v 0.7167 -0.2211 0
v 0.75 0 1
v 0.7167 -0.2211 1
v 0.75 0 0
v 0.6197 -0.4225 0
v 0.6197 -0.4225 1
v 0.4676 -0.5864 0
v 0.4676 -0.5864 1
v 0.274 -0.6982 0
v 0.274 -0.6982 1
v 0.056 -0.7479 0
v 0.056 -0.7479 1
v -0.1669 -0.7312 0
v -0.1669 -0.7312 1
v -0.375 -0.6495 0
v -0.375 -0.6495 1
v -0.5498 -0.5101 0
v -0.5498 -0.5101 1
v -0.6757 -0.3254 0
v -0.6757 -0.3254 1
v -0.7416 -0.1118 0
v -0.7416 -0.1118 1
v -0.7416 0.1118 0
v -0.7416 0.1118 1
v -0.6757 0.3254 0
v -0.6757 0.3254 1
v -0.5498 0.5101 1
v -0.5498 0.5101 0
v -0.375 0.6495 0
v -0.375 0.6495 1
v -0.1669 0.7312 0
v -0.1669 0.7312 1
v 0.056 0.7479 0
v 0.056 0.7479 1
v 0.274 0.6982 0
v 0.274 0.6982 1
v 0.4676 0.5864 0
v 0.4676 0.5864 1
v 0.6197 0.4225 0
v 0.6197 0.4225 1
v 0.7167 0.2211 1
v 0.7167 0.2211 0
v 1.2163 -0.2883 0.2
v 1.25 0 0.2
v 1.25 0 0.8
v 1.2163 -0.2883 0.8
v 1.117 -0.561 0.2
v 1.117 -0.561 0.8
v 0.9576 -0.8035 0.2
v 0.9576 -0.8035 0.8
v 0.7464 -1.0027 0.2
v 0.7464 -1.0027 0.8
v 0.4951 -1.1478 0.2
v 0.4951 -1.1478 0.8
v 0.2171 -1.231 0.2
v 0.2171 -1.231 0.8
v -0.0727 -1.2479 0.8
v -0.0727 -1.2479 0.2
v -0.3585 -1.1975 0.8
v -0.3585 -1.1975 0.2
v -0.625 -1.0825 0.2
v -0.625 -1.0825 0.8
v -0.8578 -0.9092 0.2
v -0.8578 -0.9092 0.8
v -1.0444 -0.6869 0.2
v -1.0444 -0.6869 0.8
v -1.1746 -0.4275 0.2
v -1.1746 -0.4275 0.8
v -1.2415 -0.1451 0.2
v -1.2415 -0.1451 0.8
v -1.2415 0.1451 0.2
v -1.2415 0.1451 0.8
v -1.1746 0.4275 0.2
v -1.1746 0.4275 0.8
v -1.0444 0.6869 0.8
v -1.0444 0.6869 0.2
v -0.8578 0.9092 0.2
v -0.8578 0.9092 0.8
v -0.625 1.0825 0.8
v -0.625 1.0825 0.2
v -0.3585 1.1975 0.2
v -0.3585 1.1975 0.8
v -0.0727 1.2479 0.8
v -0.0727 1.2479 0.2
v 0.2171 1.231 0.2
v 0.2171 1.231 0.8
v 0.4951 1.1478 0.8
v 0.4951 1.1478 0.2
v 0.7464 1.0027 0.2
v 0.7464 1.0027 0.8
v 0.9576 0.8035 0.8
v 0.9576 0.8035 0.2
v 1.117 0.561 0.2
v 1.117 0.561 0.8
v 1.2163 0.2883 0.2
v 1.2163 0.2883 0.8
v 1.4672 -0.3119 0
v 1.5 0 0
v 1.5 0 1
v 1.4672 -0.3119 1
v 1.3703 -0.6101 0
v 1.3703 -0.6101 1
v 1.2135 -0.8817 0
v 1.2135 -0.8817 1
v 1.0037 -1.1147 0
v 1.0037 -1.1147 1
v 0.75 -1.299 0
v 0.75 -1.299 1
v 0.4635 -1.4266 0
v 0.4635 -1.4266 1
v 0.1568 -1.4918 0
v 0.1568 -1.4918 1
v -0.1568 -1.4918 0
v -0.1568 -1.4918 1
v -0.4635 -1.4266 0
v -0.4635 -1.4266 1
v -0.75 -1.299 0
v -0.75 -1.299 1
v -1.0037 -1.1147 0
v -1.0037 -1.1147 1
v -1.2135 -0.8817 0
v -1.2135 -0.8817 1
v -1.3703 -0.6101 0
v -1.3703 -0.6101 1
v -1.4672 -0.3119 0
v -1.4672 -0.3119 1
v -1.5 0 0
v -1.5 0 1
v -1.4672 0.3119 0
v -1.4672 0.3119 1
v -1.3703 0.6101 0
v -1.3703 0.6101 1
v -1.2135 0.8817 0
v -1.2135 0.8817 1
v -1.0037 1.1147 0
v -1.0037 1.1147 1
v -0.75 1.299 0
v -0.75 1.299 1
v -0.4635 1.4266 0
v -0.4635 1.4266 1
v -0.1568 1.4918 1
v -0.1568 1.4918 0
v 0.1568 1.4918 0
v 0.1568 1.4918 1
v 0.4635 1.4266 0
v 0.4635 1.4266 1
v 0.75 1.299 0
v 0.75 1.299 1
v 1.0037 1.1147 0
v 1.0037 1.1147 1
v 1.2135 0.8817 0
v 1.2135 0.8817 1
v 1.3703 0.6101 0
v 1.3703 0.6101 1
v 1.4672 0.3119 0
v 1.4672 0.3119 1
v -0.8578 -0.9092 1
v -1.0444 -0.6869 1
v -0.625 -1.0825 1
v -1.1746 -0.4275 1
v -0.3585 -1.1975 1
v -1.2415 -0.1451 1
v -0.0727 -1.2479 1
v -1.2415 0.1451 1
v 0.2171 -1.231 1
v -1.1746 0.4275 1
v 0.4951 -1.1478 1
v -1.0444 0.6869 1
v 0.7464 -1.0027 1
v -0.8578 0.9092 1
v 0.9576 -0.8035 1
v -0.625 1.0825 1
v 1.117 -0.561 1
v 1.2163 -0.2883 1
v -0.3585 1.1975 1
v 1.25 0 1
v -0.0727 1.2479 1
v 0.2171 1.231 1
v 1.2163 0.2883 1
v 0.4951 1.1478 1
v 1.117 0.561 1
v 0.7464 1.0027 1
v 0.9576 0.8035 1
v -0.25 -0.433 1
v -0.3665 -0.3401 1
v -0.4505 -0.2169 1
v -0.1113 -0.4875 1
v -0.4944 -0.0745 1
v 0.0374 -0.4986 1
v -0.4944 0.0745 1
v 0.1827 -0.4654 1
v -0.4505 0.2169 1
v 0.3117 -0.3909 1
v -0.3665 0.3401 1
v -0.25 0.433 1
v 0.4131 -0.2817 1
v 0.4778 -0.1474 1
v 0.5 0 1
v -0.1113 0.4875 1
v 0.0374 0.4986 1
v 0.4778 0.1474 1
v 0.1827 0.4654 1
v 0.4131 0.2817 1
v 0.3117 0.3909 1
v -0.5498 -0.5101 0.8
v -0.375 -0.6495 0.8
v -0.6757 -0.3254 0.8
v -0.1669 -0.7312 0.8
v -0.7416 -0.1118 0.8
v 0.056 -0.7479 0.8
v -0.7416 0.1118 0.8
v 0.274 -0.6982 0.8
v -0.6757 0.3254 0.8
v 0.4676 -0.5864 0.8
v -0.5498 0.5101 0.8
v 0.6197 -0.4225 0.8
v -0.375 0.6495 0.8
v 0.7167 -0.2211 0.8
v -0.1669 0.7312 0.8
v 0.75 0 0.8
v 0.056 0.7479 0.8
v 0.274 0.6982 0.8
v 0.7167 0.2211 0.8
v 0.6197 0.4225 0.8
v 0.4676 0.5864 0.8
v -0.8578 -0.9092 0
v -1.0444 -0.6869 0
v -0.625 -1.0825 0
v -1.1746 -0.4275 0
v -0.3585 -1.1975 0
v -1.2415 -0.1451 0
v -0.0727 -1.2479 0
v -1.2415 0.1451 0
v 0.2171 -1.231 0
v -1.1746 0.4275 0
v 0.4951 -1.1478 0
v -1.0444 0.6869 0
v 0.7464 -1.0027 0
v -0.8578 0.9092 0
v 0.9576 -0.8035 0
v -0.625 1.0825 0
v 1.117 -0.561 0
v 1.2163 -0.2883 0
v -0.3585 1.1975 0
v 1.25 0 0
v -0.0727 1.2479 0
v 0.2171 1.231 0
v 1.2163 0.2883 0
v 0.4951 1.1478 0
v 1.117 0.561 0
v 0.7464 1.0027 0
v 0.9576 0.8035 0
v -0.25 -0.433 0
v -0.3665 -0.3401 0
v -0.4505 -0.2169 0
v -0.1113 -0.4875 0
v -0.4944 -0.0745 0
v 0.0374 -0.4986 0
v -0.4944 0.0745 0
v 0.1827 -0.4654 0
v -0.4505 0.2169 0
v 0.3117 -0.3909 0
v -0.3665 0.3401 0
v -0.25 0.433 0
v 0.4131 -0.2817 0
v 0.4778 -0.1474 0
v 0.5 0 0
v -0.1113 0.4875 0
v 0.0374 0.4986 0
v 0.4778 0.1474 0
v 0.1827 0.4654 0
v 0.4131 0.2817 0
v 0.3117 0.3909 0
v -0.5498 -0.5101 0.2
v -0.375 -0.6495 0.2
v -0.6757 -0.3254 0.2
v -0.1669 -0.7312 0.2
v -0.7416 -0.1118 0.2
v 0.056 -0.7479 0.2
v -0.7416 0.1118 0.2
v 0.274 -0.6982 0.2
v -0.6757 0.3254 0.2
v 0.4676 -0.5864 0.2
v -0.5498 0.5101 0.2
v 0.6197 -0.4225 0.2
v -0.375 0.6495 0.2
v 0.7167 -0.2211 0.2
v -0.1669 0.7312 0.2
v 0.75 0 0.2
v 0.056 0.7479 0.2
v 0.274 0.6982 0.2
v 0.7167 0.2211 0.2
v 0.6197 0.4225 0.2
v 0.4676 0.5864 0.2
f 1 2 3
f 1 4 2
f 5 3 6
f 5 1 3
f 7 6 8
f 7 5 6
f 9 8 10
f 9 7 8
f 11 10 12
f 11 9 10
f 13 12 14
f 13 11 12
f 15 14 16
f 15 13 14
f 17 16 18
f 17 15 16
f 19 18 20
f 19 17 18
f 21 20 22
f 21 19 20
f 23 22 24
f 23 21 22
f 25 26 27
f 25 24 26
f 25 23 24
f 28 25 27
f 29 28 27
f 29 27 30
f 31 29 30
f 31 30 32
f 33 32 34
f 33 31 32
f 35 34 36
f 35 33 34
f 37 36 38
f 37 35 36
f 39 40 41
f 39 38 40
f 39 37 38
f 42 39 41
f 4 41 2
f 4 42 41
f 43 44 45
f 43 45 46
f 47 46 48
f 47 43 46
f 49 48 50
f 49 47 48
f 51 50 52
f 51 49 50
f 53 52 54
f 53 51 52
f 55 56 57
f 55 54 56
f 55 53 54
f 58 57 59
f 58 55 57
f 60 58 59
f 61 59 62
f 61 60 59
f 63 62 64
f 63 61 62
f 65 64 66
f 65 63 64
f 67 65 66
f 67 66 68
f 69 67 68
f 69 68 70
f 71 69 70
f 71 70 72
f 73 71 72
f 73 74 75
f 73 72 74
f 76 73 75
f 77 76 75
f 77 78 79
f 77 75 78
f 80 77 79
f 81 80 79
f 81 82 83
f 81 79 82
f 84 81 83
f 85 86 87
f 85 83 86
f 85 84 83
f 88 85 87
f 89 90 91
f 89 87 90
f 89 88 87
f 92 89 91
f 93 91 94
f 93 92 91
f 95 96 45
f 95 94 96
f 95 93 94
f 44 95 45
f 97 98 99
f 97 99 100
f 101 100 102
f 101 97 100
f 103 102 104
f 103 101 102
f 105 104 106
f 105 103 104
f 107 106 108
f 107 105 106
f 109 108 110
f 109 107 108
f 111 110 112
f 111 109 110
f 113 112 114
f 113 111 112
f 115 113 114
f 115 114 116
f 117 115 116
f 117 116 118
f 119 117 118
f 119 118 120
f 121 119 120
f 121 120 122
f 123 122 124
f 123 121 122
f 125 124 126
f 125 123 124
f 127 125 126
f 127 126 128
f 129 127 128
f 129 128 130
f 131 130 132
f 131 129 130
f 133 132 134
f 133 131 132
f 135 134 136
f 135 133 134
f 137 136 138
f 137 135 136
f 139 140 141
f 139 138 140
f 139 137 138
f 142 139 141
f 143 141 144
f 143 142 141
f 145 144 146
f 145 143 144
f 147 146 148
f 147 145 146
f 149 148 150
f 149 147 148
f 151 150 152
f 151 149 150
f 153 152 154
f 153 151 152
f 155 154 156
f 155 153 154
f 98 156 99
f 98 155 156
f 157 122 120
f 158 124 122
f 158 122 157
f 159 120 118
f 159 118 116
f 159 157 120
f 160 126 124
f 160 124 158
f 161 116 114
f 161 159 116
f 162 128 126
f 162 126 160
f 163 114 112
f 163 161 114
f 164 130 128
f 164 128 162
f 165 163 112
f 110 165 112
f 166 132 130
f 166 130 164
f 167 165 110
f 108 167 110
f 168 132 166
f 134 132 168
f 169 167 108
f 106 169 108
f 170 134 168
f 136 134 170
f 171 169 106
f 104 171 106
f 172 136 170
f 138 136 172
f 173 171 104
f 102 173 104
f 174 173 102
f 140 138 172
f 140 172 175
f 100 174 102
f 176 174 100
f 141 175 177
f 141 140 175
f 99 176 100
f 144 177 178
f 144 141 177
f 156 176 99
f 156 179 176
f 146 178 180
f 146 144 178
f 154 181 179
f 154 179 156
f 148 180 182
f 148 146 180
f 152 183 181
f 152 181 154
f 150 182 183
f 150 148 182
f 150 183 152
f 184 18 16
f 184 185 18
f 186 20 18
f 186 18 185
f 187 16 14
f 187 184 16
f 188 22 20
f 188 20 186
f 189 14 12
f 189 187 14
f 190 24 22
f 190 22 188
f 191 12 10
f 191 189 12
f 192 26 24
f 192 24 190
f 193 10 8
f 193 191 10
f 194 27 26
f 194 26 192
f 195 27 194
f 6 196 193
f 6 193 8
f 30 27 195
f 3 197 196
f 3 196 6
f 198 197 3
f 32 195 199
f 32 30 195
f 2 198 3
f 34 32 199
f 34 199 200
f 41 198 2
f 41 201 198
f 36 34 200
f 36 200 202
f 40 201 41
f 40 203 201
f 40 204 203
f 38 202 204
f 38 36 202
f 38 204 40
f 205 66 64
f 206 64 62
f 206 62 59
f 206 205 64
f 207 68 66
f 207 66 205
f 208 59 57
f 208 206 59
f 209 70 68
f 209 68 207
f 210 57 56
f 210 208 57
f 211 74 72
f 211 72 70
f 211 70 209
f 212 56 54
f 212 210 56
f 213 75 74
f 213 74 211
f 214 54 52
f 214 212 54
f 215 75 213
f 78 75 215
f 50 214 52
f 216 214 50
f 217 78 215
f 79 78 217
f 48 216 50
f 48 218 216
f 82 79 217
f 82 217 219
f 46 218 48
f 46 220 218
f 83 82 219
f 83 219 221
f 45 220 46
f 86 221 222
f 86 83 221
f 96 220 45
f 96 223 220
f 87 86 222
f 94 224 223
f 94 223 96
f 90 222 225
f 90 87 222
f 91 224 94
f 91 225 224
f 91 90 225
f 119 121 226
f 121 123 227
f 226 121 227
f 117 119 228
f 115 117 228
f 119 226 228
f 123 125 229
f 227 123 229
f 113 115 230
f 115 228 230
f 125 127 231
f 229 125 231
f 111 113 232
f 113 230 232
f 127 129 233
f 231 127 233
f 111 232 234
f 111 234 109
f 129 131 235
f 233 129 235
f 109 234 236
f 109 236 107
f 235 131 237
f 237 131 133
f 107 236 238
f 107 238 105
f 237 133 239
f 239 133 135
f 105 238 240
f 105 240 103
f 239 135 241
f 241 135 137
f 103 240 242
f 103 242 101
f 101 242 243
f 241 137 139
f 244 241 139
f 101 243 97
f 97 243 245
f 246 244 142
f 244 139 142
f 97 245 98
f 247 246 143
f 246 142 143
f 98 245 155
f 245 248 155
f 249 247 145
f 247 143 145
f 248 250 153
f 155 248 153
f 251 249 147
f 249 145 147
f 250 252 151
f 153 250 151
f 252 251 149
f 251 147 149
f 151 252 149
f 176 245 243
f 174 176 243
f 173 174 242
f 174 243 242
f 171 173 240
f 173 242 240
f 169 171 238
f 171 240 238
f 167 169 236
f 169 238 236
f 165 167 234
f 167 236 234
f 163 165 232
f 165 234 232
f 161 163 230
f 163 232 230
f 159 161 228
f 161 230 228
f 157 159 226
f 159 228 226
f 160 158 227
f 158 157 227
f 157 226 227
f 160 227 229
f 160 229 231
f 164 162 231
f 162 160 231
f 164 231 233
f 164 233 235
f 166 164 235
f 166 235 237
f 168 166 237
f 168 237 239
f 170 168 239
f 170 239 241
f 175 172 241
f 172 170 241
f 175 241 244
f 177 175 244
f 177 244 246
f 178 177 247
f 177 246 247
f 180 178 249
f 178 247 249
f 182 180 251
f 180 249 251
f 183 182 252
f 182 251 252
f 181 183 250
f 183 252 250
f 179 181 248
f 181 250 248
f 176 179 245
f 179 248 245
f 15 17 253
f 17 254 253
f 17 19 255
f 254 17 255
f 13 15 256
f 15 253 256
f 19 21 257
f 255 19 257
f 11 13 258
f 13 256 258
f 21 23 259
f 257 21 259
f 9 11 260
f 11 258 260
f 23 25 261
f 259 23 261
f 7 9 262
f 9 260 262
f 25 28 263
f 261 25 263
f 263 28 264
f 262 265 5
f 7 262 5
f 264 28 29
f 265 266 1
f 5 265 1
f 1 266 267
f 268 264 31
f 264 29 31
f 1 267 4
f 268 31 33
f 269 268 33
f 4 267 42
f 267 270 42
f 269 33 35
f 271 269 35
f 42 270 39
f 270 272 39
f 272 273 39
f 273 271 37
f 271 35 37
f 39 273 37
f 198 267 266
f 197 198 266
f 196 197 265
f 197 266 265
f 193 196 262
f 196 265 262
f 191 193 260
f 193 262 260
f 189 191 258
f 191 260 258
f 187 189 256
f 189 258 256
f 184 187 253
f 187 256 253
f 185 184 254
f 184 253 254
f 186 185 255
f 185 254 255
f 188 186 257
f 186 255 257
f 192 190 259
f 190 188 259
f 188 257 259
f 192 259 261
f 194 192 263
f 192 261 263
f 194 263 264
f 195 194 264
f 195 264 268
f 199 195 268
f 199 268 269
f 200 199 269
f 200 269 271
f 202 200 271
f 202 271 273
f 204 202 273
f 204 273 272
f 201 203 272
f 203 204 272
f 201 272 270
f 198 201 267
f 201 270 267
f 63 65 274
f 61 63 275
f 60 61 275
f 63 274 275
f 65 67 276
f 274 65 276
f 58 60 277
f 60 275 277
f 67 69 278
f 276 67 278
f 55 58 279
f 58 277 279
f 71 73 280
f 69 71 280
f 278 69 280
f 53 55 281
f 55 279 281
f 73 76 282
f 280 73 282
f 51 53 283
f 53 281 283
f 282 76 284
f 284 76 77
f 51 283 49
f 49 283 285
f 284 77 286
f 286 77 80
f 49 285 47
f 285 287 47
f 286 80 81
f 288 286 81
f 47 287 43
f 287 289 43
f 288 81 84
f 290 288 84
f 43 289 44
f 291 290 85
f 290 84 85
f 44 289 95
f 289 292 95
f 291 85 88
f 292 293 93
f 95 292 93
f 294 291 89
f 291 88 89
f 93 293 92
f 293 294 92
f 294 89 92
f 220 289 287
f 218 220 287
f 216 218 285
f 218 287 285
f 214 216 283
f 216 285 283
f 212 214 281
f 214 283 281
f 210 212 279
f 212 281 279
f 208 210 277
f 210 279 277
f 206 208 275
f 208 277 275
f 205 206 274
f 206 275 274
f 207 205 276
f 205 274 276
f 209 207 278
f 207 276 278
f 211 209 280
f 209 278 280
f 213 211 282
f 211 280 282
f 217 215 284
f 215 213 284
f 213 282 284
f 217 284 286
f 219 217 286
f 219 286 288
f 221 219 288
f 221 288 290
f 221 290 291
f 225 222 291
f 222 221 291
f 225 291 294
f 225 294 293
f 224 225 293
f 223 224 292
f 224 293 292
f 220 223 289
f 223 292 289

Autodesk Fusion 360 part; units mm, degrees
sketch "スケッチ1" plane through (0, 0, 0) normal (0, 0, 1) x (1, 0, 0)
  circle A0 centre (0, 0) radius 1.5
  circle A1 centre (0, 0) radius 1.25
  circle A2 centre (0, 0) radius 0.75
  circle A3 centre (0, 0) radius 0.5
  dimension "d1" = 3
  dimension "d2" = 1
  dimension "d3" = 1.5
  dimension "d4" = 2.5
extrude "押し出し1" add sketch "スケッチ1" along normal blind 1 contours A0 makes body 1
extrude "押し出し2" add sketch "スケッチ1" along normal blind 0.6 from surface at 0.2 separate body contours A1 makes body 2
extrude "押し出し1'" add sketch "スケッチ1" along normal blind 1 separate body contours A2 makes body 3 in component "Component'"
component "Component'" placed x (1, 0, 0) y (0, 1, 0) z (0, 0, 1) at (0, 0, 0)
